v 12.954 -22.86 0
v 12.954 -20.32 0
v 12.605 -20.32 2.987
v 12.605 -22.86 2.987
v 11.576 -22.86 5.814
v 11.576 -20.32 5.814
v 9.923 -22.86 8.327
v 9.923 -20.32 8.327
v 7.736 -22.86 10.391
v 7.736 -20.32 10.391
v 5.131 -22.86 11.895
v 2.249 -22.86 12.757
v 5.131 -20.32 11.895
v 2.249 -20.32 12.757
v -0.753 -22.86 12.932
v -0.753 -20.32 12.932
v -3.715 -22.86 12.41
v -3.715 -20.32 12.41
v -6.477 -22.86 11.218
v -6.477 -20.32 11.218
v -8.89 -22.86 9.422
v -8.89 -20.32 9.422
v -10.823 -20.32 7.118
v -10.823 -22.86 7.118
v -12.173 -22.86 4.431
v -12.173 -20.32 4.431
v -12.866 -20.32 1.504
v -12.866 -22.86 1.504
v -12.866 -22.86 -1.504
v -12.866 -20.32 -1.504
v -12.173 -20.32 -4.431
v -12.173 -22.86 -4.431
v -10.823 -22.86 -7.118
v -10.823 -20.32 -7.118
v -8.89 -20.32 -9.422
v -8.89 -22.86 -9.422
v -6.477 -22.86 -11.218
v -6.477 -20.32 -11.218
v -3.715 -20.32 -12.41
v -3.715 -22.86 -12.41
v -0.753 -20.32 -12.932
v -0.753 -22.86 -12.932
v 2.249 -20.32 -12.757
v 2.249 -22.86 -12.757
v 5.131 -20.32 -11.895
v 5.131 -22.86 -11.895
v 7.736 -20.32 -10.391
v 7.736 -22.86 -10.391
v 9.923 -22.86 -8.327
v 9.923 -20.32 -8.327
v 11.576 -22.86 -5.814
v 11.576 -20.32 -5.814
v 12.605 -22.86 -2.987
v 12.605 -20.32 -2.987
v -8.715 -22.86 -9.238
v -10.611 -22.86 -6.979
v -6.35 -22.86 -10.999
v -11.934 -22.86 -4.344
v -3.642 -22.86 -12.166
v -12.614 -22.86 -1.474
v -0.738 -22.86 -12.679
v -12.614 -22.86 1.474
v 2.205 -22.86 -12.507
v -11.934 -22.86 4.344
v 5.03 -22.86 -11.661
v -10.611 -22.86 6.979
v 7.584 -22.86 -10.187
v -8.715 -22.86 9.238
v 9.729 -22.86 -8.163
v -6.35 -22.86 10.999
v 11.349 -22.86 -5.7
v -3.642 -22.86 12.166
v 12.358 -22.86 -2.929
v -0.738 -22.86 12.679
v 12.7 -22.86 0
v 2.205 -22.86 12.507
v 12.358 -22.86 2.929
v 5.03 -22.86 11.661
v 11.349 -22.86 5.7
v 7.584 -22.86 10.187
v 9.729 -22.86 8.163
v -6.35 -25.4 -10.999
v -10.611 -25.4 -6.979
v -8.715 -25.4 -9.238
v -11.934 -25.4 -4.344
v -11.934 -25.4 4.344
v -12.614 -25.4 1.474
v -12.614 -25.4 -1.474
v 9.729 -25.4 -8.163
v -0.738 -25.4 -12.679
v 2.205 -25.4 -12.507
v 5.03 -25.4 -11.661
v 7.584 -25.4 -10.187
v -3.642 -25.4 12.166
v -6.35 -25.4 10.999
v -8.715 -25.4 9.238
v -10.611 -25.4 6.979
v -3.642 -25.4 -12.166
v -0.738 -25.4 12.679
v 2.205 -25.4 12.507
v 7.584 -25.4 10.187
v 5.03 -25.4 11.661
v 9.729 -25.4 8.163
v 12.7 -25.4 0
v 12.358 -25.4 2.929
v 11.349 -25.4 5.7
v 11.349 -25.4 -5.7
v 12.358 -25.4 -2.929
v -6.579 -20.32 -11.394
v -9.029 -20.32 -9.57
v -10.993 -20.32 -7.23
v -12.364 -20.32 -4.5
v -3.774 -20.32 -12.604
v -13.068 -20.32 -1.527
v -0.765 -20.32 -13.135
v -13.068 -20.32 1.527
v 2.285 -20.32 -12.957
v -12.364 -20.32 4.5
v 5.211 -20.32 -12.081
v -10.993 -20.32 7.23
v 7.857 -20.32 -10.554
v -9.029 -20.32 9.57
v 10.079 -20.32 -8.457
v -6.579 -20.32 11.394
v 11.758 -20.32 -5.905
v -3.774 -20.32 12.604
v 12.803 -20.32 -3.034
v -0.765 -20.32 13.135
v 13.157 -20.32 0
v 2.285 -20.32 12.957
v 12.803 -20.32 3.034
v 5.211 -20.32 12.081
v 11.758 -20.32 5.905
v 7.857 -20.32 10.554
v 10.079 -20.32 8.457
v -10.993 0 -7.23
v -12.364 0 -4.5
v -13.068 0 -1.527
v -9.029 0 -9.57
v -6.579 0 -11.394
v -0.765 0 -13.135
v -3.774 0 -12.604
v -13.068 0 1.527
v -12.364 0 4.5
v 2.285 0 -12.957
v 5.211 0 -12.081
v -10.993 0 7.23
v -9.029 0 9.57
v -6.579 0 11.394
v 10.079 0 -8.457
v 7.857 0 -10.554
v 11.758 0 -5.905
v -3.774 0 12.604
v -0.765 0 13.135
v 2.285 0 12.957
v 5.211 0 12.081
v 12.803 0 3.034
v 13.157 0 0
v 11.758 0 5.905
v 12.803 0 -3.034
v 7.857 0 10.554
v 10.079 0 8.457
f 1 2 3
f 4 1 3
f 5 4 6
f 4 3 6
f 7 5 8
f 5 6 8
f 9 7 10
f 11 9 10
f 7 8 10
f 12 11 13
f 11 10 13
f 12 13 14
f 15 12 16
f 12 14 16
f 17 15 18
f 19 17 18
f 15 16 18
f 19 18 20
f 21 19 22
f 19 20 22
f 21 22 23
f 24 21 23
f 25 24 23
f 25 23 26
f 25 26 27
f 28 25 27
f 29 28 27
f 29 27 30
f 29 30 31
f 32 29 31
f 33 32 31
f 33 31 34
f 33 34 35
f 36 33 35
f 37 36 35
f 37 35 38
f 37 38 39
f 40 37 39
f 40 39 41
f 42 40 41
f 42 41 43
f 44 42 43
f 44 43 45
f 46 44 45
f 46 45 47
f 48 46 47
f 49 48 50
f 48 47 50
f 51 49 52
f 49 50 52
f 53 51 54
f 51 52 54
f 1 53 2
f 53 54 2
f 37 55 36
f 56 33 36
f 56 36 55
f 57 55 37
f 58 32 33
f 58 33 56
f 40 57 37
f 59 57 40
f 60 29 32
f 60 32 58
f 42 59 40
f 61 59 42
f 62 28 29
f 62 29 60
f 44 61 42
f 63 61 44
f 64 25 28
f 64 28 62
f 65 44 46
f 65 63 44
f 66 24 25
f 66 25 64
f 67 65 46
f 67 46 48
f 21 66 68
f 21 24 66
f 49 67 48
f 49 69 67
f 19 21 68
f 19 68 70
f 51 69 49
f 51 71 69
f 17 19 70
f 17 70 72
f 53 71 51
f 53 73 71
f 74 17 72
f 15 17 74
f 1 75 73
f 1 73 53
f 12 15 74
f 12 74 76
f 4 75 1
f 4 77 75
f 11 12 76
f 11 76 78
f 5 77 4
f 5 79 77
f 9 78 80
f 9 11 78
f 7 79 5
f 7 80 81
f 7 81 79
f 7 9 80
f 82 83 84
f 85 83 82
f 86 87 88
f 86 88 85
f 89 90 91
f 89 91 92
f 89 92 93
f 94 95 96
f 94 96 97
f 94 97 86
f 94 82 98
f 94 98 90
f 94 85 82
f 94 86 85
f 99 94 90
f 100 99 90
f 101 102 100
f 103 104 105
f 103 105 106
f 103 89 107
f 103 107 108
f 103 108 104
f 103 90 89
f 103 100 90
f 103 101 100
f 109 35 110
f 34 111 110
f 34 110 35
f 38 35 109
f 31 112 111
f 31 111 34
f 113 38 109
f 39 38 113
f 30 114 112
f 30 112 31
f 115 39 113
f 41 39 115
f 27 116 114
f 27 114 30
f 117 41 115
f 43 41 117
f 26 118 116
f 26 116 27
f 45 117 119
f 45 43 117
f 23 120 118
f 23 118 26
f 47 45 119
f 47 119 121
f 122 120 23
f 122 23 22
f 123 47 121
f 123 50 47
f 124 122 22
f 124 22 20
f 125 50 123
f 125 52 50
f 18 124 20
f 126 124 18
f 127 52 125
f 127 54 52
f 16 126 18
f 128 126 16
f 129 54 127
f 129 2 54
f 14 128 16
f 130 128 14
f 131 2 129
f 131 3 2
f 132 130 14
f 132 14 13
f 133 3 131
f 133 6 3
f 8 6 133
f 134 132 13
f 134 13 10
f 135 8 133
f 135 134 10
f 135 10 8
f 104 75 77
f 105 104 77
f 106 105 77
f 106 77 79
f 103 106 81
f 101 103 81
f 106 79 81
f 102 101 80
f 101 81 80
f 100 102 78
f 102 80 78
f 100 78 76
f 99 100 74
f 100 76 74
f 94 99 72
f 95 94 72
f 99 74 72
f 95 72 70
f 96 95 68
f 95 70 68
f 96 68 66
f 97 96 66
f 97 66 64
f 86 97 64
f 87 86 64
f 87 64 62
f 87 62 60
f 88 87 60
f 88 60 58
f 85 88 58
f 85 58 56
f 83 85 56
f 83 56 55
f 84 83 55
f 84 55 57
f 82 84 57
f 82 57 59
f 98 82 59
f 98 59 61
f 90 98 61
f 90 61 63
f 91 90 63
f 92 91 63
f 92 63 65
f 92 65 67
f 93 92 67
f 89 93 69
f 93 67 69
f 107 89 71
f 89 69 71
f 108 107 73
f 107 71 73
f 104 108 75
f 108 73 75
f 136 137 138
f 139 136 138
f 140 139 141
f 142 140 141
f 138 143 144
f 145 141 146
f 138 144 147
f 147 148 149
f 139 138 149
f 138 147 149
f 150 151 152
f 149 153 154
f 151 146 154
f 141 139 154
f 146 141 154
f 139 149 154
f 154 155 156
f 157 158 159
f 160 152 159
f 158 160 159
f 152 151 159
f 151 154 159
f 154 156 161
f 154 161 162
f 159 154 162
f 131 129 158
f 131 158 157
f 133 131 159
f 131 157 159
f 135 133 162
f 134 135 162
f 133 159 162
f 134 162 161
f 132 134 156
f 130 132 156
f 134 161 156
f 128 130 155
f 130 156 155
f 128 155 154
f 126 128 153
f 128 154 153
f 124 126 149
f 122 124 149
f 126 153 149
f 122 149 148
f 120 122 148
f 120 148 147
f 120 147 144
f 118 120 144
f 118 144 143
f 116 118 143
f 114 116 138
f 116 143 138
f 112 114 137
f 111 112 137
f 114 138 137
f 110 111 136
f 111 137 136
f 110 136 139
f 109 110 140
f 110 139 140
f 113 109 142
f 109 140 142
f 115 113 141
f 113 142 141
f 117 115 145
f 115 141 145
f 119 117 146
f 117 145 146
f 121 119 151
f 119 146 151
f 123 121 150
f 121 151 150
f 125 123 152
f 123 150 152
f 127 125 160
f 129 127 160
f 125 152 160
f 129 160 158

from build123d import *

# Parameters (mm, degrees)
F0_R     = 12.7
F1_DEPTH = 25.4
F2_R     = 12.954
F3_DEPTH = 22.86
F4_R     = 13.1572
F5_DEPTH = 20.32


with BuildPart() as f1:
    # F0 (on Front) → F1 (new body)
    with BuildSketch(Plane.XZ):
        Circle(F0_R)
    extrude(amount=F1_DEPTH)

    # F2 (on Front) → F3 (join)
    with BuildSketch(Plane.XZ):
        Circle(F2_R)
    extrude(amount=F3_DEPTH)

    # F4 (on Front) → F5 (join)
    with BuildSketch(Plane.XZ):
        Circle(F4_R)
    extrude(amount=F5_DEPTH)


solid = f1.part
